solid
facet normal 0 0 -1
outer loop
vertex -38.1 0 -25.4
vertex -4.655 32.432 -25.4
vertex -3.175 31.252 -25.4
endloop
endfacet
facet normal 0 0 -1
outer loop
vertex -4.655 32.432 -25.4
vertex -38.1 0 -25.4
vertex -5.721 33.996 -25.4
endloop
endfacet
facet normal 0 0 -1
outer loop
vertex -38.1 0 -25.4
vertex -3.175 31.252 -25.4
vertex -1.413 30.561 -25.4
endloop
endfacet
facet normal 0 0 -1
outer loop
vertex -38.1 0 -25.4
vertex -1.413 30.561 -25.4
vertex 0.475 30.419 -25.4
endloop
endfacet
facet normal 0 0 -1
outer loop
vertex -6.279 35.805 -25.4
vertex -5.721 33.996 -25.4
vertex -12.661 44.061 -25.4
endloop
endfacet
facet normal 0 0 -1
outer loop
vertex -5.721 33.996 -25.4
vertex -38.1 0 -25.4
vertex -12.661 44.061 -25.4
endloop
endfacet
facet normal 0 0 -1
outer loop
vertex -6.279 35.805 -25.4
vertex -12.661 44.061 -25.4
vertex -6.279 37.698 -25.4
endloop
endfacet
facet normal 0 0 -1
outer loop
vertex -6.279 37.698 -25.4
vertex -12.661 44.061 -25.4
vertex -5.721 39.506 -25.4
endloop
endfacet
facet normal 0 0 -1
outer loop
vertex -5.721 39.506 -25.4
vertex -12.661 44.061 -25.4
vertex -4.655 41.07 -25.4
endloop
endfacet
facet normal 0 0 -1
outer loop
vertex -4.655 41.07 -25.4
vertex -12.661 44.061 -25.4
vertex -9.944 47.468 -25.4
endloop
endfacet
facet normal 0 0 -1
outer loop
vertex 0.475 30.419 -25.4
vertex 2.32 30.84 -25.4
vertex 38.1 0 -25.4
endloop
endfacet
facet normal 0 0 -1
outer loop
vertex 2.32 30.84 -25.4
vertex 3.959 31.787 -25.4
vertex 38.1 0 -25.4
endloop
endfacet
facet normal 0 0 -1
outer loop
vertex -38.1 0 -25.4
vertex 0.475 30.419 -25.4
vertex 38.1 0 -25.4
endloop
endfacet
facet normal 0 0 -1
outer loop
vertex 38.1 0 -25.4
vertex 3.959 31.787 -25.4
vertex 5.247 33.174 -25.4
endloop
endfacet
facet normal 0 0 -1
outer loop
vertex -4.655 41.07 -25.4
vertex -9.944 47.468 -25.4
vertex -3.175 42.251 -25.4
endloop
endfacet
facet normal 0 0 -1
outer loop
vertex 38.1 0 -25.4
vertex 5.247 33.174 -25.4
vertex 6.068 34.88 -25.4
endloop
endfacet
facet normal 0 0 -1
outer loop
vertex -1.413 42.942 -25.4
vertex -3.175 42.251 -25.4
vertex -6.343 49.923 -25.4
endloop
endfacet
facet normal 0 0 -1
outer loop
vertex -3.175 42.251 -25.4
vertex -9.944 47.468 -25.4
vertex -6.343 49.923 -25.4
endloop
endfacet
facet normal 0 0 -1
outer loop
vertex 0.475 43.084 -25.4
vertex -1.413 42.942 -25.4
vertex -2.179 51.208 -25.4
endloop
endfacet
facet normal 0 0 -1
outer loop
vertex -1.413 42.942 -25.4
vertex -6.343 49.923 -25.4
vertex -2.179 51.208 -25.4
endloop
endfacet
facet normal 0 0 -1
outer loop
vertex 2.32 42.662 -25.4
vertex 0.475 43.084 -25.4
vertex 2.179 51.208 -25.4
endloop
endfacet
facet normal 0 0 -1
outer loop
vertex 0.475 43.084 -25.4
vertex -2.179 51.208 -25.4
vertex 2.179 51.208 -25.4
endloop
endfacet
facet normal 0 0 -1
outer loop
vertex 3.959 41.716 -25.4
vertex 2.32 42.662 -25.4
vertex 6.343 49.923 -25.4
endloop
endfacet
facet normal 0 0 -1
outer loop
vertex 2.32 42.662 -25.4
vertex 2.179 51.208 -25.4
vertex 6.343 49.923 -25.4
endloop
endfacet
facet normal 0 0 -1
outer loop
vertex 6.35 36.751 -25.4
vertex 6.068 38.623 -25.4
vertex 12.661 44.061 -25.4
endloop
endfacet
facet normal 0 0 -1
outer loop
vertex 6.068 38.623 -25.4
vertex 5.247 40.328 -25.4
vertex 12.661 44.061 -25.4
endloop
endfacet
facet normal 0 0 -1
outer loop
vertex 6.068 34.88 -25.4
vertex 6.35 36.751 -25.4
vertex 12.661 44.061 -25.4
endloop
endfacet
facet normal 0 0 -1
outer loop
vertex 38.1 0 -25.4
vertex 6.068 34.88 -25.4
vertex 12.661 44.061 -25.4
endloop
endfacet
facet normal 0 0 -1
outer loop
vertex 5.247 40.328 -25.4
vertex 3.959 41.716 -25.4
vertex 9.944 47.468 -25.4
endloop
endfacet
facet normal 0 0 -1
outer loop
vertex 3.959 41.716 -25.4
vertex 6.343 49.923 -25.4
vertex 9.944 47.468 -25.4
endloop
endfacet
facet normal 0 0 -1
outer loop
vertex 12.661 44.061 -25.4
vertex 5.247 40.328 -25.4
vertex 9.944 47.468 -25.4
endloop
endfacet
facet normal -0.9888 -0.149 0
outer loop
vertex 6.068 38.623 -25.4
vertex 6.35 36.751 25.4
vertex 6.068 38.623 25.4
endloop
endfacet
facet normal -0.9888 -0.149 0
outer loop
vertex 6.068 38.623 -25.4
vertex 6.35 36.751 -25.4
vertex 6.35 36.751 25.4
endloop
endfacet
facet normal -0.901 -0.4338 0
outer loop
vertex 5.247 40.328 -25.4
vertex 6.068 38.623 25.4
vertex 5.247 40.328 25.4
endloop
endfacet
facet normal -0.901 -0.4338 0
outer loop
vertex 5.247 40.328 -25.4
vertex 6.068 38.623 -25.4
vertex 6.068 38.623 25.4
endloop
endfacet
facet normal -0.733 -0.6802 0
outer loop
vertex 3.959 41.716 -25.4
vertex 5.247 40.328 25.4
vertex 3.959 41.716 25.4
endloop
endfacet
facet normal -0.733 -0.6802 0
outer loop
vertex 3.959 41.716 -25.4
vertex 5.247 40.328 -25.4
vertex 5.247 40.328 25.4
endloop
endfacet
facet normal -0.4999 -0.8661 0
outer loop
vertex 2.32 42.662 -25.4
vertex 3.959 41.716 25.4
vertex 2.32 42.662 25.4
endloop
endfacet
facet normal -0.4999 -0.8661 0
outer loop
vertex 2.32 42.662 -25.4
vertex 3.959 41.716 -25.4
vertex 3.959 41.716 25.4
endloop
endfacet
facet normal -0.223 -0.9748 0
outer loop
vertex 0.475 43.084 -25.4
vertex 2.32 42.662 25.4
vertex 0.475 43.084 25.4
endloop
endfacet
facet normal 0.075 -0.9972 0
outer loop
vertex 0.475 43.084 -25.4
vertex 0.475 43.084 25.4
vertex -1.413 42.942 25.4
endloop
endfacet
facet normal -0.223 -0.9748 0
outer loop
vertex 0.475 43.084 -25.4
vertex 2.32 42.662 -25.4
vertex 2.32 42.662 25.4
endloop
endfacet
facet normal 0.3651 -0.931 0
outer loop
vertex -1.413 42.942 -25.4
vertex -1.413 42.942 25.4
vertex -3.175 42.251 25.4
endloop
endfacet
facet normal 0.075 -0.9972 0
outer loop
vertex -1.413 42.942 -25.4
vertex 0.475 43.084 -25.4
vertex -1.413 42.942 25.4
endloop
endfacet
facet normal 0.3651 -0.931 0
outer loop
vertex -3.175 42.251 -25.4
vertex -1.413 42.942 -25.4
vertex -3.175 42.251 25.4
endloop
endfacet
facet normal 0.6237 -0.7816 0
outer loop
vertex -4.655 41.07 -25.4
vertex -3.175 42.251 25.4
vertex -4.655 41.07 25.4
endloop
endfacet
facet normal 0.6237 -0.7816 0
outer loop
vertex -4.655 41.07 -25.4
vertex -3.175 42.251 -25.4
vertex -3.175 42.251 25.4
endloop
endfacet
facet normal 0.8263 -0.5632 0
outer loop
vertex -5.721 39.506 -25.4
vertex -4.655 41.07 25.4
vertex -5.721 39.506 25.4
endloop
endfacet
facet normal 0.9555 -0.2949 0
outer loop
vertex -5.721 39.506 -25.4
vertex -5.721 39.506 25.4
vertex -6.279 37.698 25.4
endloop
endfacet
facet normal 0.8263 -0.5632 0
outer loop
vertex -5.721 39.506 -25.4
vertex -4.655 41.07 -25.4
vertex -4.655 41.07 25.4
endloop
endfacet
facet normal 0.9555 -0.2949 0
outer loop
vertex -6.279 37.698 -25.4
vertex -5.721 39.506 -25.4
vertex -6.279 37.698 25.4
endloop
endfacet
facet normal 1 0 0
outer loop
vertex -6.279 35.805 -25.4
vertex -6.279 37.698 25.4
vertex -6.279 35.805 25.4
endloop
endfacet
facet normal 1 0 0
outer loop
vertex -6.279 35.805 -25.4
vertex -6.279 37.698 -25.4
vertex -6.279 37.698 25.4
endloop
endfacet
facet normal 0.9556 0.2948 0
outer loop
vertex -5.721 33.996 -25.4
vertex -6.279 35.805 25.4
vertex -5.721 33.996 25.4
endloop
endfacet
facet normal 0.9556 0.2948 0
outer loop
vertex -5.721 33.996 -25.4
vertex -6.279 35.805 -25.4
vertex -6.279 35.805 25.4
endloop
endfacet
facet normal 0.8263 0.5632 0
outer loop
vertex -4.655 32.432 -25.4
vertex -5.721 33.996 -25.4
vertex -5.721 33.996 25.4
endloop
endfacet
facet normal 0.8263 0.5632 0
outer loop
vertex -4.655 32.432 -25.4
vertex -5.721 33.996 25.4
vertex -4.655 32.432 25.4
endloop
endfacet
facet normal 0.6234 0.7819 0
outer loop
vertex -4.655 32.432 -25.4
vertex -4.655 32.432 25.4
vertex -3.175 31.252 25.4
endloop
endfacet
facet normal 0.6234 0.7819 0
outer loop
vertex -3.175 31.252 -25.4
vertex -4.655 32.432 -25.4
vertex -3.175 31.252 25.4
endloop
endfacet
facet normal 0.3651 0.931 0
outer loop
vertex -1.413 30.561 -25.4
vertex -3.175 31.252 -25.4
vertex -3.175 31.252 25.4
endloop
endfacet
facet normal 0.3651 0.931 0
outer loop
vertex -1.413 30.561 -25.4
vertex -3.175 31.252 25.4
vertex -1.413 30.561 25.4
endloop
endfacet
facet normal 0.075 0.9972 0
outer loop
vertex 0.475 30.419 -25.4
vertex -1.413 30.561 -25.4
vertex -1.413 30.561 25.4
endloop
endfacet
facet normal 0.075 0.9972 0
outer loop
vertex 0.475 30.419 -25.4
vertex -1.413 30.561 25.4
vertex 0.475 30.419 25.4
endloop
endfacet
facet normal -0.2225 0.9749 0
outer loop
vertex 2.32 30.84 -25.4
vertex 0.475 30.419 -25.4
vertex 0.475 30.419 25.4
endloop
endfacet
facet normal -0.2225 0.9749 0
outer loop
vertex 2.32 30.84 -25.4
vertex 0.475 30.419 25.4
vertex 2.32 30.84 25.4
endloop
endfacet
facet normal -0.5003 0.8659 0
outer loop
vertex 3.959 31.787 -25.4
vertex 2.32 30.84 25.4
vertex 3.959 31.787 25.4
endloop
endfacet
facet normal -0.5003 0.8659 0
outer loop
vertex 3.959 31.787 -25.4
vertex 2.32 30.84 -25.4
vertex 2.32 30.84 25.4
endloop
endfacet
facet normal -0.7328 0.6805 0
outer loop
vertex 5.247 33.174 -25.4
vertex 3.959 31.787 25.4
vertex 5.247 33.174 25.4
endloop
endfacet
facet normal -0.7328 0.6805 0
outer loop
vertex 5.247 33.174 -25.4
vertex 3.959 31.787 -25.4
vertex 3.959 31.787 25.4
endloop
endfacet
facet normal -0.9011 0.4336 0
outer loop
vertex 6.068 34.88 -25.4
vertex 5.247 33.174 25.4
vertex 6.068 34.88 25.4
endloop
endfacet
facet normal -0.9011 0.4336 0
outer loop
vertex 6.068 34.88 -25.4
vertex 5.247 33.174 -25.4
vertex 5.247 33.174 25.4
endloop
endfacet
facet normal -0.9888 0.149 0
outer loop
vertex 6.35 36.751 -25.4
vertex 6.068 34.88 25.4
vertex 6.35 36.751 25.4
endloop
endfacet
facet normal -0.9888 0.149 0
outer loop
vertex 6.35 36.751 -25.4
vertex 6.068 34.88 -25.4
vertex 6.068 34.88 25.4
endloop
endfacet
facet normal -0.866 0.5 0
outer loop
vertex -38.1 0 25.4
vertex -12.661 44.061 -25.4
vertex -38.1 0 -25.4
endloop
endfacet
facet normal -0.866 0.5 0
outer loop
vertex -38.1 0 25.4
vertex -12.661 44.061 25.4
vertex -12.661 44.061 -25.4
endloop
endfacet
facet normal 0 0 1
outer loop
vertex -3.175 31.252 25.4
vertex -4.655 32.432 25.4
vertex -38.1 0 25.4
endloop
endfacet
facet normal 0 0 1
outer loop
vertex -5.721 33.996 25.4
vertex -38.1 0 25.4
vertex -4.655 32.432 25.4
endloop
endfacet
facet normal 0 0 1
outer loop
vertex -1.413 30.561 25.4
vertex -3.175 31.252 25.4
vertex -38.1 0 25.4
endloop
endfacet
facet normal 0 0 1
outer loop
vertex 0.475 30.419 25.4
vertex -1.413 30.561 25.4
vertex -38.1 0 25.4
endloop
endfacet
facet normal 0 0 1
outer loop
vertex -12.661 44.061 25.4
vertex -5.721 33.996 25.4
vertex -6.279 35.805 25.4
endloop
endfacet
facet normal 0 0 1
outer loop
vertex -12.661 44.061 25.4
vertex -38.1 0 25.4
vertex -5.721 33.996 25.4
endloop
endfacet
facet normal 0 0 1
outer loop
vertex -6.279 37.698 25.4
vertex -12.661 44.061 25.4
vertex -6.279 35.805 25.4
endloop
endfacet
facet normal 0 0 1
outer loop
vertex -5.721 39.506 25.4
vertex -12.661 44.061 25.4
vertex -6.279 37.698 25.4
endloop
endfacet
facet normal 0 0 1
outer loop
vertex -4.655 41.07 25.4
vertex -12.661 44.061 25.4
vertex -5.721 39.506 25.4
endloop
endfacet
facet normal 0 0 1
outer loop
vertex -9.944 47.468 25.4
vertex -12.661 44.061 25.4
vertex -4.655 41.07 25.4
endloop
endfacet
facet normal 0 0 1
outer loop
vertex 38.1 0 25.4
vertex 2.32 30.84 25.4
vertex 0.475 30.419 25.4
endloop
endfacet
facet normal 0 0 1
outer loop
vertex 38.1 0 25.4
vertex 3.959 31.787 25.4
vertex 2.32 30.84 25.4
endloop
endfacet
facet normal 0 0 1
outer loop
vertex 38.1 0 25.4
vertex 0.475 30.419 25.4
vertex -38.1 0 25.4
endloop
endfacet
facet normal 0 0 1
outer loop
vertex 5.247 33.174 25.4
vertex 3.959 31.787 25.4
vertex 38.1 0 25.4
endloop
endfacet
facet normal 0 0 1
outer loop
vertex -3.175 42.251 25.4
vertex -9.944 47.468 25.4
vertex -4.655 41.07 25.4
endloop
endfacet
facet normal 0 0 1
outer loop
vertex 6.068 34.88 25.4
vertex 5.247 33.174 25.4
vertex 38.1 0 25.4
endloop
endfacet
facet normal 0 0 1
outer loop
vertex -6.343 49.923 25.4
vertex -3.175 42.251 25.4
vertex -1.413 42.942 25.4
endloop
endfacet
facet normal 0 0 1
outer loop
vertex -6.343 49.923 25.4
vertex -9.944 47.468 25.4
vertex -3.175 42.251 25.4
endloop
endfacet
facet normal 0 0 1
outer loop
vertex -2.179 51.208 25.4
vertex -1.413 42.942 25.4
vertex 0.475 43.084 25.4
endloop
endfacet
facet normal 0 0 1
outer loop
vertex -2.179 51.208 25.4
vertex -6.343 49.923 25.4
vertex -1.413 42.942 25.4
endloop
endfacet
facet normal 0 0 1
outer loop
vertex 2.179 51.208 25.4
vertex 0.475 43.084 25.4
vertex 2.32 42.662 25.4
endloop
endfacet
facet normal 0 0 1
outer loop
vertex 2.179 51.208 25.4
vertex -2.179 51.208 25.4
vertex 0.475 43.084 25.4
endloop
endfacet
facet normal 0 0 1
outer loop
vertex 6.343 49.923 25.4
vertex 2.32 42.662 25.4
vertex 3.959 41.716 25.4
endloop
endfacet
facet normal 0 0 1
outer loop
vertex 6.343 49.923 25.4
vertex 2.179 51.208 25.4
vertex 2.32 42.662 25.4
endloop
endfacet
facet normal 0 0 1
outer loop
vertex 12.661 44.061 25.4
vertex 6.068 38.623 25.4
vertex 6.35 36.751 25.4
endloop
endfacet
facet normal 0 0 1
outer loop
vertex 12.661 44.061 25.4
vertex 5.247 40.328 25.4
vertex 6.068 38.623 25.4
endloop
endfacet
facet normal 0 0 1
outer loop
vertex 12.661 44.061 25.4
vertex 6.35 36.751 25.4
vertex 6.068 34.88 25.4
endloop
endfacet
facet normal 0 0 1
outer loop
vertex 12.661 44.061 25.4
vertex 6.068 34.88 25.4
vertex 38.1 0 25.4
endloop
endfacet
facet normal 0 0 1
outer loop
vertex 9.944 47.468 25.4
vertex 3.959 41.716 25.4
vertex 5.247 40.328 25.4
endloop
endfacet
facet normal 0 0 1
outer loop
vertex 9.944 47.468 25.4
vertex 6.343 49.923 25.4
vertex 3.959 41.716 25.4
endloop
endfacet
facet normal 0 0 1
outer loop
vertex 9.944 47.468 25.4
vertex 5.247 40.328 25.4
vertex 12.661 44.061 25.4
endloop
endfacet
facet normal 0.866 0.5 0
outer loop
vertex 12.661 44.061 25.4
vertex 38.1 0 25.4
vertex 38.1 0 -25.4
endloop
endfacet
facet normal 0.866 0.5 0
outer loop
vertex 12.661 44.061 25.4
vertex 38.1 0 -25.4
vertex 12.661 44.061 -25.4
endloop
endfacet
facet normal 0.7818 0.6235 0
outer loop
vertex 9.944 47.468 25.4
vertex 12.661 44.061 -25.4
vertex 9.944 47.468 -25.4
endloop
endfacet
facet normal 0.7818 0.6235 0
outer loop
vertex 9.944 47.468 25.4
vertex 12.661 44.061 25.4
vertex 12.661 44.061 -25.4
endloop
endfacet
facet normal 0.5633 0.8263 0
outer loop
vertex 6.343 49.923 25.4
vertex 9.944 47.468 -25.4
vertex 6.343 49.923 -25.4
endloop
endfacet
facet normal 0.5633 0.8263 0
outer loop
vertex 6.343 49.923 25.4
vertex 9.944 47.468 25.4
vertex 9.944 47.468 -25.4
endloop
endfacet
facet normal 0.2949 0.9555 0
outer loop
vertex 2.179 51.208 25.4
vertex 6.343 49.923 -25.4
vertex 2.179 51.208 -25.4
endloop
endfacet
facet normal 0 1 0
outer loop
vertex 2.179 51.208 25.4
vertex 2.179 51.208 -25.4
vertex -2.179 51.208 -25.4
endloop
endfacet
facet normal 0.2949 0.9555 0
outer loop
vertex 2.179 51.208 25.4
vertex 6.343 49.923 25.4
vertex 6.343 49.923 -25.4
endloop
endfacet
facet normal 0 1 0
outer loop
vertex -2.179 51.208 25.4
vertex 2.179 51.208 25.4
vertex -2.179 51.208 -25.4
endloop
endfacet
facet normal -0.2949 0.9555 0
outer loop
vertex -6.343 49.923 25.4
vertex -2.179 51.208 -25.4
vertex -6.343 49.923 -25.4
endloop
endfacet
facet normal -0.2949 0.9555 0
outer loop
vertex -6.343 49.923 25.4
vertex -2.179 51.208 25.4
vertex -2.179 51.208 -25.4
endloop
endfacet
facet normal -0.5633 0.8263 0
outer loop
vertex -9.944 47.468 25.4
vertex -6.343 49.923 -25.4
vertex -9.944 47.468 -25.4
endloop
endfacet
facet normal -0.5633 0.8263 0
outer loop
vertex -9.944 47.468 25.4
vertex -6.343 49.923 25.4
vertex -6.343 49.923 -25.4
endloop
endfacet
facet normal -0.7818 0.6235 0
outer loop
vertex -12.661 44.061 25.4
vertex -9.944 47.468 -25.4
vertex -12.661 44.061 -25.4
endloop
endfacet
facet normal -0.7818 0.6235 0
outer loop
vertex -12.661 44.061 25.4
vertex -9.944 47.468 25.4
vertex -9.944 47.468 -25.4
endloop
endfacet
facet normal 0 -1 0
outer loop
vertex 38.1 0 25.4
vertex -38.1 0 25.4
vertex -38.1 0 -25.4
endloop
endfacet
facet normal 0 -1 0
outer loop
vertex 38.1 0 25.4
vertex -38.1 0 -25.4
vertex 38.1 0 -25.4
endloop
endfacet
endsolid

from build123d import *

# Parameters (mm, degrees)
F0_R     = 6.35
F1_DEPTH = 25.4


with BuildPart() as f1:
    # F0 (on Top) → F1 (new body, symmetric)
    with BuildSketch(Plane.XY):
        with BuildLine():
            Line((-12.661204, 44.061287), (-38.1, 0))
            Line((-38.1, 0), (38.1, 0))
            Line((38.1, 0), (12.661204, 44.061287))
            ThreePointArc((12.661204, 44.061287), (0, 51.371237), (-12.661204, 44.061287))
        make_face()
        with Locations((0, 36.751337)):
            Circle(F0_R, mode=Mode.SUBTRACT)
    extrude(amount=F1_DEPTH, both=True)


solid = f1.part
